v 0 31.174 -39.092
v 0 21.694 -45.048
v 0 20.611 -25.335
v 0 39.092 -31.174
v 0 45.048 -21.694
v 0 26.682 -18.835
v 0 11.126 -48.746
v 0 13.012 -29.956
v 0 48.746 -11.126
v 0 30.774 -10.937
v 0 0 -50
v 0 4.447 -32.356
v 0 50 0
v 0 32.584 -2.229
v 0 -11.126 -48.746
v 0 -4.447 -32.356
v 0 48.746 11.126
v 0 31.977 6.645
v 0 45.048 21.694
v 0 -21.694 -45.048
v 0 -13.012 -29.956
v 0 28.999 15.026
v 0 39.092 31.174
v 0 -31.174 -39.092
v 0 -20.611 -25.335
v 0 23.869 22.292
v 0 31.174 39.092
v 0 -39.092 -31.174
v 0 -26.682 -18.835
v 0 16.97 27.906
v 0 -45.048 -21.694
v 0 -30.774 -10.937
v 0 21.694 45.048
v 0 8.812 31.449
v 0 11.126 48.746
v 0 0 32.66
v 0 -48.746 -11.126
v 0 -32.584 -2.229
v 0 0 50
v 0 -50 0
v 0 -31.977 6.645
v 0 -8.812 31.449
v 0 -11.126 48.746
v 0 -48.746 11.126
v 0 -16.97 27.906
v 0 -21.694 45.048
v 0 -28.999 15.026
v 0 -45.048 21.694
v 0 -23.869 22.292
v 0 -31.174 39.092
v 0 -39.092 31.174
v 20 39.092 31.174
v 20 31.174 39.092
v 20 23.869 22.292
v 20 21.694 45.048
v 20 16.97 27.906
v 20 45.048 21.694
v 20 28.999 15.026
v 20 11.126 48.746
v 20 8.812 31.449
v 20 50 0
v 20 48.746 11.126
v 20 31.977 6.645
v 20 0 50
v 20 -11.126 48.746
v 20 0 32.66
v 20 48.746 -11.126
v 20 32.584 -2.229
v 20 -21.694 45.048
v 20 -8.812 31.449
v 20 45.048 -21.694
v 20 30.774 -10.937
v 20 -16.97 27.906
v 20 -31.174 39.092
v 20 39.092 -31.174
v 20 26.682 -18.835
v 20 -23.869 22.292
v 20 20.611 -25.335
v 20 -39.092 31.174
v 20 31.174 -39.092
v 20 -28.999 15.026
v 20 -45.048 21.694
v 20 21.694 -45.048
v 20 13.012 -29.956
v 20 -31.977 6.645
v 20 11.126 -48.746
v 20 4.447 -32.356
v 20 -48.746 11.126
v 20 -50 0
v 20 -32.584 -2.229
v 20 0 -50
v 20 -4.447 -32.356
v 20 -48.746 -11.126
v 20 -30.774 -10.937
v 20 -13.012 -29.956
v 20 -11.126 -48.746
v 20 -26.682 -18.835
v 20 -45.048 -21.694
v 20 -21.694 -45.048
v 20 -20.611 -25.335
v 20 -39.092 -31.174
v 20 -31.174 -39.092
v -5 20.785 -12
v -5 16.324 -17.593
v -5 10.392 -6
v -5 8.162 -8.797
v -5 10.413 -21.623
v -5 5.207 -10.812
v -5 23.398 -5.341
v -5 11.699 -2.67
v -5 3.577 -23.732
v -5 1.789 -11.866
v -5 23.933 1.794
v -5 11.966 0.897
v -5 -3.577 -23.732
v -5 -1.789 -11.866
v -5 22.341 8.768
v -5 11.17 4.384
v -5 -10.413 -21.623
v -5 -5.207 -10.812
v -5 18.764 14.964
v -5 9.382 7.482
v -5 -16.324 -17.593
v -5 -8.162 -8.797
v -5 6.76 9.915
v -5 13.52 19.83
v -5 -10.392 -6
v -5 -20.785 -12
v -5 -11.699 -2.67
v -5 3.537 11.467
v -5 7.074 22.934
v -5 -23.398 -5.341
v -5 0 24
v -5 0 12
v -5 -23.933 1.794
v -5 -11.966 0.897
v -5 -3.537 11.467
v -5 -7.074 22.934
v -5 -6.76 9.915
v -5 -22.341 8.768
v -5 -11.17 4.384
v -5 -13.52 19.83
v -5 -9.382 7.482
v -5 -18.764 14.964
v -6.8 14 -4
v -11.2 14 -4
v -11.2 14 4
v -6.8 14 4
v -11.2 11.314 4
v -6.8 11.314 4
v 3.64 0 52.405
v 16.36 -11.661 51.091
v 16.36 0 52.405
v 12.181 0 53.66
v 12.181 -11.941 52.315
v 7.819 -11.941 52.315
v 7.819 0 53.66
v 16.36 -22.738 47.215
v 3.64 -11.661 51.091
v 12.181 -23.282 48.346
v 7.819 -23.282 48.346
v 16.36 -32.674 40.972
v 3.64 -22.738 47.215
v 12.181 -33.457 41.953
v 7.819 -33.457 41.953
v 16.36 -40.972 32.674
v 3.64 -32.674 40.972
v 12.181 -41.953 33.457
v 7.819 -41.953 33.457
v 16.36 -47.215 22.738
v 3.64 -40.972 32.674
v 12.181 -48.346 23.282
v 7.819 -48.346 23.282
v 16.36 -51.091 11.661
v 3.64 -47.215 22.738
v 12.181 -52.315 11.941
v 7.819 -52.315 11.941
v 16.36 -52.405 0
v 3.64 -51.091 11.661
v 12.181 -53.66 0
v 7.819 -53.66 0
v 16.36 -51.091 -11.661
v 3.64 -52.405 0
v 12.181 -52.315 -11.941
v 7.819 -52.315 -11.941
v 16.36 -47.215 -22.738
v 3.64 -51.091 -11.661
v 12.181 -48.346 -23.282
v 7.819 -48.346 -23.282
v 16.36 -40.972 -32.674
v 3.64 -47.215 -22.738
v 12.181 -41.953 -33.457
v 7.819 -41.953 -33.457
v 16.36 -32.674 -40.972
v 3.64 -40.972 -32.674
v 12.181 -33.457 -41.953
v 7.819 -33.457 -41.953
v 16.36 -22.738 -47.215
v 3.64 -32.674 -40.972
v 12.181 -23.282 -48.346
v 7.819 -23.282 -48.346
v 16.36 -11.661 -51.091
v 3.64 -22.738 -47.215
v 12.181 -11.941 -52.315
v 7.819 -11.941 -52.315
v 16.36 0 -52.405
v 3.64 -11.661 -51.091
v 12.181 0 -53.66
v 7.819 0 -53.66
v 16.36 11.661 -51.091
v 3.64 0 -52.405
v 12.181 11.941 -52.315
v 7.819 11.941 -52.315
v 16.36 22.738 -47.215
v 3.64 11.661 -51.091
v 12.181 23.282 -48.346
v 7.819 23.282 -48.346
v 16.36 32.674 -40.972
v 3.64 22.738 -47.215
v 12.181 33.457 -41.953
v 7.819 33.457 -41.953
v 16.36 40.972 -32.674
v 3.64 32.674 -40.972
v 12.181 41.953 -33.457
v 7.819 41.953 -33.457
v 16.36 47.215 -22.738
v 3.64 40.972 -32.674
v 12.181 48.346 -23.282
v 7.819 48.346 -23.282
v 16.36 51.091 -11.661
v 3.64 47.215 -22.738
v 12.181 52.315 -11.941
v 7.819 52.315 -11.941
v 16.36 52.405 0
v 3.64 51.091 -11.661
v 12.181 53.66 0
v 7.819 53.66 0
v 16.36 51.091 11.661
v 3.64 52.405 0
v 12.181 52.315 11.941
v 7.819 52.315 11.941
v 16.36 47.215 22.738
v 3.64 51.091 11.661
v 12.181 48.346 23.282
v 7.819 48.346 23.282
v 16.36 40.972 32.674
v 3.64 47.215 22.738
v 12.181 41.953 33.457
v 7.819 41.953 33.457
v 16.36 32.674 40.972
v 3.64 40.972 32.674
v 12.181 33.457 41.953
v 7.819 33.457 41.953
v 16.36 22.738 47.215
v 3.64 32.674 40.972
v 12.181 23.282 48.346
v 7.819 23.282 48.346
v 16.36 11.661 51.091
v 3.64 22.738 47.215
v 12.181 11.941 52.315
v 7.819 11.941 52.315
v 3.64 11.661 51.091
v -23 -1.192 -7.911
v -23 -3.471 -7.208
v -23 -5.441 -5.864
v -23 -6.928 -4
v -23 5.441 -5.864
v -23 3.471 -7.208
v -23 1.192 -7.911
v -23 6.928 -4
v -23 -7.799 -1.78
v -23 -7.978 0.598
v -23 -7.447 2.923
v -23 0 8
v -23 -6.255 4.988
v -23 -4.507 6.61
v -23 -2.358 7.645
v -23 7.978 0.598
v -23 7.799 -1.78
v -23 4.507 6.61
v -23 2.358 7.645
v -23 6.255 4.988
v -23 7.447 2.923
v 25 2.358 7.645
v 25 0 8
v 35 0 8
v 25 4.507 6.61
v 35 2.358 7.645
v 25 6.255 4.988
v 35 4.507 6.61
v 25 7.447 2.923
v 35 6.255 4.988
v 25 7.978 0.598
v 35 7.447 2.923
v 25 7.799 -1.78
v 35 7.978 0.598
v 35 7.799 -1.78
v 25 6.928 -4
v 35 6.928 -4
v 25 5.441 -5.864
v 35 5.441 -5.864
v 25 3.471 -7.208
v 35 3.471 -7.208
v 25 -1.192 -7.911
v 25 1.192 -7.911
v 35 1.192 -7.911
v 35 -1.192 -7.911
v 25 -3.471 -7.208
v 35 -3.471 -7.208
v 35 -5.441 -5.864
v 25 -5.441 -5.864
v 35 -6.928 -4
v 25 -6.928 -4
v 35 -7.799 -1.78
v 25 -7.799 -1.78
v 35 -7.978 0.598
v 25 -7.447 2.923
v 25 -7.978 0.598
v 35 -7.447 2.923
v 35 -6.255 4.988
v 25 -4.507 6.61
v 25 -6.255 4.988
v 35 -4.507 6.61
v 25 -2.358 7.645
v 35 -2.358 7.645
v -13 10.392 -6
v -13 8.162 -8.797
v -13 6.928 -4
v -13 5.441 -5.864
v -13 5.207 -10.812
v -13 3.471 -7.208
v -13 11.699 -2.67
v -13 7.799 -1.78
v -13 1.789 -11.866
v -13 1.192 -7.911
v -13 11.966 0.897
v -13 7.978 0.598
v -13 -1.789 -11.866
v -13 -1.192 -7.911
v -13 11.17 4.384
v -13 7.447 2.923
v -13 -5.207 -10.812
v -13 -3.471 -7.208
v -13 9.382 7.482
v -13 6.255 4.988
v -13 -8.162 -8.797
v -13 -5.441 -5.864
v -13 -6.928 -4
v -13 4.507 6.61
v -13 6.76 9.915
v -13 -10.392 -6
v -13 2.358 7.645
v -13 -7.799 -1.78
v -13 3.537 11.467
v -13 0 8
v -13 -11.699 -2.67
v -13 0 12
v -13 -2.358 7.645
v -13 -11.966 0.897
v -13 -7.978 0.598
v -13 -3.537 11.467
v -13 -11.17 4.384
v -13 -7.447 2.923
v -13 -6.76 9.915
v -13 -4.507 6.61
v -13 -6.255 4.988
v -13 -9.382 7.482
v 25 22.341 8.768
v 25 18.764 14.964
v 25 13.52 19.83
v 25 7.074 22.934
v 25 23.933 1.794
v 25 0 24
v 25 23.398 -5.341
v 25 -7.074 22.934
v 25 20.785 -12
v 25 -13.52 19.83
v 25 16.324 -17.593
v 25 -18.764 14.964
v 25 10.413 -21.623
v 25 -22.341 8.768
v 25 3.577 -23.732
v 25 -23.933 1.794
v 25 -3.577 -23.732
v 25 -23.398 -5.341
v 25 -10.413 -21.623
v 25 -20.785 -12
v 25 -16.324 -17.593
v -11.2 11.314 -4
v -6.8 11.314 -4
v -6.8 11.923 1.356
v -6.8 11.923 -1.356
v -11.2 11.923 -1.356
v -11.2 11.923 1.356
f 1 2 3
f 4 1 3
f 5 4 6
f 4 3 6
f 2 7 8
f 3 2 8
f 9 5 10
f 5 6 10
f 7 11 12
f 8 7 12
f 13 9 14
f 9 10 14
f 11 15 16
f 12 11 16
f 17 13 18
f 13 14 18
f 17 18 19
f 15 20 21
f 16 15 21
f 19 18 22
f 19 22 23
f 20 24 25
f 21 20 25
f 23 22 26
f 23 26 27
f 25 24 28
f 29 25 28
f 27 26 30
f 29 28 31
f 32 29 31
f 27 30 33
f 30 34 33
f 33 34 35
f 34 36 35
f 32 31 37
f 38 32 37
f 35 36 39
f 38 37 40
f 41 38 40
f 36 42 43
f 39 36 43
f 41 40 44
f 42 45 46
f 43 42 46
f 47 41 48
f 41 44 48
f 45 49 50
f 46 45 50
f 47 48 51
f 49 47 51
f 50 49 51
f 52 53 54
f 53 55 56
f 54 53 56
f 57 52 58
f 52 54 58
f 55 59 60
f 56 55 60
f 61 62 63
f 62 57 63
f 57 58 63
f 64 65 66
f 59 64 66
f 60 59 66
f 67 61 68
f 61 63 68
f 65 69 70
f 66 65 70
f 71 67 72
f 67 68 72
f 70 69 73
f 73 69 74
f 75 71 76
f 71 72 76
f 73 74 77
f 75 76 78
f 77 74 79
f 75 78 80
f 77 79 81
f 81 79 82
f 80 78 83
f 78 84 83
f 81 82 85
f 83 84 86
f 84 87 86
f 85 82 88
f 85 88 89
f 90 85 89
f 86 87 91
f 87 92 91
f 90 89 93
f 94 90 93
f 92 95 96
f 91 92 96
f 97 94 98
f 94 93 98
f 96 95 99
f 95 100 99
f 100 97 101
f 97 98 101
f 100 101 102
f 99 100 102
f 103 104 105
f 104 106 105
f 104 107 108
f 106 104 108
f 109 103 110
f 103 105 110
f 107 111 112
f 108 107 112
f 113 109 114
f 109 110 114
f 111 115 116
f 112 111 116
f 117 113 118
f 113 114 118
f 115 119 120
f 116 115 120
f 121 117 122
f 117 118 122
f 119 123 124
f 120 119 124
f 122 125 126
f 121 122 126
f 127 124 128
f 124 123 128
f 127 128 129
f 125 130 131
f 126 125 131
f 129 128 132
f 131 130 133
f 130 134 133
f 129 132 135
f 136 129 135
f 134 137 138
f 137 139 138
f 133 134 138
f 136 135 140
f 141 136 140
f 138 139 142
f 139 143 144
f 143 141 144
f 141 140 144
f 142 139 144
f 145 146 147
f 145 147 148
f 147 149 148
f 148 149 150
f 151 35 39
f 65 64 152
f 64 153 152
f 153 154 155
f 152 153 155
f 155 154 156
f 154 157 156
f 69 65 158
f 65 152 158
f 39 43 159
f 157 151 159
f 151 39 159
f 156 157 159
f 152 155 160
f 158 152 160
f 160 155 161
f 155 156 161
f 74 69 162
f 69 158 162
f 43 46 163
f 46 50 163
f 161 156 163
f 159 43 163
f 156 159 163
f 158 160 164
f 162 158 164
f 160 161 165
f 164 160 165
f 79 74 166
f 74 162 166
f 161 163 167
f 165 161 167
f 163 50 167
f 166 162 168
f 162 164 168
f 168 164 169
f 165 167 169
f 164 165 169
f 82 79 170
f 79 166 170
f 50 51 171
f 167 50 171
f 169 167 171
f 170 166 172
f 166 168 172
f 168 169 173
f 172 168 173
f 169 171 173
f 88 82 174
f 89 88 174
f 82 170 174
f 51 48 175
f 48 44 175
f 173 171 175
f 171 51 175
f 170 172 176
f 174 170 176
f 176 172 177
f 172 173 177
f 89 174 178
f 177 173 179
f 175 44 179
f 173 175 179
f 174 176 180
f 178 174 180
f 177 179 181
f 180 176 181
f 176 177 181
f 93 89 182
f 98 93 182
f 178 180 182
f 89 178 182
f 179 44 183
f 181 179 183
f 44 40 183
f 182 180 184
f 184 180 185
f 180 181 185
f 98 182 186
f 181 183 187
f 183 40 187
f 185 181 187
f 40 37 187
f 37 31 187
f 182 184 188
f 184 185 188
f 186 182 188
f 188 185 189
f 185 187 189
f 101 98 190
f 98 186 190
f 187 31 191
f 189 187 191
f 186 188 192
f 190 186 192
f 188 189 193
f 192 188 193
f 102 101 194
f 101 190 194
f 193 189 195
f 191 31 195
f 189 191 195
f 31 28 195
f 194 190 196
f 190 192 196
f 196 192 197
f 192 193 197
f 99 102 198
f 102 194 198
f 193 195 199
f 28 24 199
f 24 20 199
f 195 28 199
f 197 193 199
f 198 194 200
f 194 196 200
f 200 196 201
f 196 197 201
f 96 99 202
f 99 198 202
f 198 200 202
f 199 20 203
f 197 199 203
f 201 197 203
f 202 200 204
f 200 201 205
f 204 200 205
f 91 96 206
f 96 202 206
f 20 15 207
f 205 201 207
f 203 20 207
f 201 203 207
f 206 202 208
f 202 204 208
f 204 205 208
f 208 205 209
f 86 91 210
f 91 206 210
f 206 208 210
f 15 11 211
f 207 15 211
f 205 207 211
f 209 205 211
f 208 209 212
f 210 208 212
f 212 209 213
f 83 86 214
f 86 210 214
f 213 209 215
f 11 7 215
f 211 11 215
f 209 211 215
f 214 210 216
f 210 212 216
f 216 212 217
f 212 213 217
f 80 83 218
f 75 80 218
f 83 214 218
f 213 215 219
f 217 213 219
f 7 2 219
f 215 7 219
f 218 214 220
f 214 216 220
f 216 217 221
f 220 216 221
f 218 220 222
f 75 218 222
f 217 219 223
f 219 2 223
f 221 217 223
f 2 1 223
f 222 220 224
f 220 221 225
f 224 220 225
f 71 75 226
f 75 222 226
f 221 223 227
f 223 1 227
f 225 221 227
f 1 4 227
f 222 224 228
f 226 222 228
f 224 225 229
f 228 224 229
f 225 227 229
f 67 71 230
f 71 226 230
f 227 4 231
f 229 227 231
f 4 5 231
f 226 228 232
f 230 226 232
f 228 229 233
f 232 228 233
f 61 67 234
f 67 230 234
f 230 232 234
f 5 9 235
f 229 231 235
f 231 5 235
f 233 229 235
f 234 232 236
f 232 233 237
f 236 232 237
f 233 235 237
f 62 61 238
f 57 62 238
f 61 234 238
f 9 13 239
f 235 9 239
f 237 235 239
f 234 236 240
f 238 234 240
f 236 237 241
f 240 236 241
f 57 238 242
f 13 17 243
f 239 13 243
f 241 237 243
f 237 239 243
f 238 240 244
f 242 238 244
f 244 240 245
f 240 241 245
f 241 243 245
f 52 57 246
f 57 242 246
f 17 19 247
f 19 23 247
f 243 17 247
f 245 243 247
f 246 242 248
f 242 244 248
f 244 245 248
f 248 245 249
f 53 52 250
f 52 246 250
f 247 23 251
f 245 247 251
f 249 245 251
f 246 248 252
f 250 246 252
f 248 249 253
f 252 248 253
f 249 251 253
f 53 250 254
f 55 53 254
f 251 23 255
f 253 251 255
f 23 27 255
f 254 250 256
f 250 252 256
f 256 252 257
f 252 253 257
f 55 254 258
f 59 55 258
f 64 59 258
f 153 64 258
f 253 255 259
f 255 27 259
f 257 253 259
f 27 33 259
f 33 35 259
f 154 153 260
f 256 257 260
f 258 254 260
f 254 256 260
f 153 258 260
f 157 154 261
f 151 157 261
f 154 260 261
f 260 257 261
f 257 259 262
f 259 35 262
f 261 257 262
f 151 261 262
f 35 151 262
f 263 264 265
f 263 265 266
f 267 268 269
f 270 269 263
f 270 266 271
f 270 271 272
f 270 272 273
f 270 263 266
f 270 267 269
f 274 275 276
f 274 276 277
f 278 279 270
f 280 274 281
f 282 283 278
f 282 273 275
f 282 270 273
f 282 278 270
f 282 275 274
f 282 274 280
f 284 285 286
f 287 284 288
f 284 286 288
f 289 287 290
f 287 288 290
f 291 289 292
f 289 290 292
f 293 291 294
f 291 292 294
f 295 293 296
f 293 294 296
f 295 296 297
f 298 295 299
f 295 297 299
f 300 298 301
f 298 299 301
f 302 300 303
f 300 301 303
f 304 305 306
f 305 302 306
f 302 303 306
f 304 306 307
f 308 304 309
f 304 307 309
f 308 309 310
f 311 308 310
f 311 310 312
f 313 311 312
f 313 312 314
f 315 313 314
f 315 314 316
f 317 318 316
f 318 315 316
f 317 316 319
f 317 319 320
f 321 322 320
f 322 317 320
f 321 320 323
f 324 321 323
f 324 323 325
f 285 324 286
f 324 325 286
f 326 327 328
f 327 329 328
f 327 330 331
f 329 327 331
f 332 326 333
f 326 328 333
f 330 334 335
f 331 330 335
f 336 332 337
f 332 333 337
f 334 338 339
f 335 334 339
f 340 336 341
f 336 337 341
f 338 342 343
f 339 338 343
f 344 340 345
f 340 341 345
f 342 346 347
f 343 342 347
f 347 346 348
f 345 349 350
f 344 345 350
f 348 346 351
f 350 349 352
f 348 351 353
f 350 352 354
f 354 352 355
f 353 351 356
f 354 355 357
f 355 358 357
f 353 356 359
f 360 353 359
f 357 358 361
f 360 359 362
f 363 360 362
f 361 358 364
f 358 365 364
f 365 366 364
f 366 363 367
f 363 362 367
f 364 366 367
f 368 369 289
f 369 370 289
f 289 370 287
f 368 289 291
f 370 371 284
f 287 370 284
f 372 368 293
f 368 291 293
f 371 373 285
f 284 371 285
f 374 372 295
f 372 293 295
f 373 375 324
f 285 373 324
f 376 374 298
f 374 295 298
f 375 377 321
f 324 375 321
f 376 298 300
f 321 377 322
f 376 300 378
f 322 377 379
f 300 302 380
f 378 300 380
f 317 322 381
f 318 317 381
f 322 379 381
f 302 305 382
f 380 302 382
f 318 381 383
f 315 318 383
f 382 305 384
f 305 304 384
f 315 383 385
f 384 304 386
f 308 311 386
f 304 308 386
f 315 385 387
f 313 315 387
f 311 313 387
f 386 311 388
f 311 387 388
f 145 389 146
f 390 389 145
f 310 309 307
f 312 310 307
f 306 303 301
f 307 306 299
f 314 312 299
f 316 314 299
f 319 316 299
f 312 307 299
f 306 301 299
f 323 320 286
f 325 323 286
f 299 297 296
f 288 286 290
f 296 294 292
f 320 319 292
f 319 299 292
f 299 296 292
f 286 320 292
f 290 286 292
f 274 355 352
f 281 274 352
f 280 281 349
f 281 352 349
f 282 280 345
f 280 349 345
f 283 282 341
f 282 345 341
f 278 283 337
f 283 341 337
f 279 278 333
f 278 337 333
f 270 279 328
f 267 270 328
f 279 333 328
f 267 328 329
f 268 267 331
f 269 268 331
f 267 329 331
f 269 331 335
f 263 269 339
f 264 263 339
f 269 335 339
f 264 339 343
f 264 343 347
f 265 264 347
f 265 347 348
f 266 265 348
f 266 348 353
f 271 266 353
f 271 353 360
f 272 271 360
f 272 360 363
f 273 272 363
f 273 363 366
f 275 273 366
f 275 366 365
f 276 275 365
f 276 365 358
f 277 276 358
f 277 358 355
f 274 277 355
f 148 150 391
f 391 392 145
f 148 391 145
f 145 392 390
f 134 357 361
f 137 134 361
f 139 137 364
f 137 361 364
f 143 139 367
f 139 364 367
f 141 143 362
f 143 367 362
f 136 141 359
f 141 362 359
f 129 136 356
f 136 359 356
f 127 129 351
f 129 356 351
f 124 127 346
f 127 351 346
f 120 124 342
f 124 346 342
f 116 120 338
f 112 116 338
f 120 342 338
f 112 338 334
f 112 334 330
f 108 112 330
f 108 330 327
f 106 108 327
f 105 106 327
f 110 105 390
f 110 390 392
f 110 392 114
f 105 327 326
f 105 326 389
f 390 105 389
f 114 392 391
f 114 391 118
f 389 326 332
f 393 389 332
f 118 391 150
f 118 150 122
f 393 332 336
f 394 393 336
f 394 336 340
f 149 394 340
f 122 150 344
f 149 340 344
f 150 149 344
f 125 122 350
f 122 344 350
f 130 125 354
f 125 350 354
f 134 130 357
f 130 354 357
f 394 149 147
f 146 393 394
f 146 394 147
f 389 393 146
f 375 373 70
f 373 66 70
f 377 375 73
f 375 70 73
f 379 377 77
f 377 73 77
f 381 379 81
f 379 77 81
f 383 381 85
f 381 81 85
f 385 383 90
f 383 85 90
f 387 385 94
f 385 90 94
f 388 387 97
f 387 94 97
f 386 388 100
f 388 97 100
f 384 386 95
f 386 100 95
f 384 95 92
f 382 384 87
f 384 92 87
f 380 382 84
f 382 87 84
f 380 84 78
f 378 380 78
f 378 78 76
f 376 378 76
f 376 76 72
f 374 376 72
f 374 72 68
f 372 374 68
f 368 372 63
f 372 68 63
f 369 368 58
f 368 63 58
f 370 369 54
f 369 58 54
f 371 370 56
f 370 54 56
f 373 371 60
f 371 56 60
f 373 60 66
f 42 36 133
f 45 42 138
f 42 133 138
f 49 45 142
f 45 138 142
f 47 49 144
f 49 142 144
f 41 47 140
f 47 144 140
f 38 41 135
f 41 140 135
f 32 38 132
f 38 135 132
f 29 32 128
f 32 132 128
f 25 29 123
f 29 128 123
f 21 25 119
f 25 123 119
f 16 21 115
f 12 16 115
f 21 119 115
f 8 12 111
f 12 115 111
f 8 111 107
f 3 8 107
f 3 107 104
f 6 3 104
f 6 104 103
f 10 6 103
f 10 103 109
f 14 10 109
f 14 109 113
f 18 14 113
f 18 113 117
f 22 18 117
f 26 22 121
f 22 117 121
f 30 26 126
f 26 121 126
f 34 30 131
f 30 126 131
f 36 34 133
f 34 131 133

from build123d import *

# Parameters (mm, degrees)
EXTRUDE_1_DEPTH      = 10
EXTRUDE_1_DEPTH_BACK = 48
SKETCH_2_R           = 8
SKETCH_3_W           = 4.4
SKETCH_3_H           = 8
EXTRUDE_2_DEPTH      = 14


with BuildPart() as part:
    # 草图1 → 旋转1 (revolve)
    with BuildSketch(Plane.XY, mode=Mode.PRIVATE) as revolve_1_sk:
        with BuildLine():
            Line((20, 0), (25, 0))
            Line((25, 0), (25, 24))
            Line((25, 24), (20, 32.660254038))
            Line((20, 32.660254038), (20, 50))
            ThreePointArc((20, 50), (10, 53.819660113), (0, 50))
            Line((0, 50), (0, 32.660254038))
            Line((0, 32.660254038), (-5, 24))
            Line((-5, 24), (-5, 12))
            Line((-5, 12), (-13, 12))
            Line((-13, 12), (-13, 0))
            Line((-13, 0), (-5, 0))
            Line((-5, 0), (0, 0))
            Line((0, 0), (20, 0))
        make_face()
    revolve(revolve_1_sk.sketch.rotate(Axis((0, 0, 0), (1, 0, 0)), 90), axis=Axis((0, 0, 0), (1, 0, 0)))

    # 草图2 → 凸台-拉伸1 (add, two sides: drawn at the far end of the back side and taken through both)
    with BuildSketch(Plane.ZY.offset(13).offset(-EXTRUDE_1_DEPTH_BACK)):
        Circle(SKETCH_2_R)
    extrude(amount=EXTRUDE_1_DEPTH + EXTRUDE_1_DEPTH_BACK)

    # 草图3 → 凸台-拉伸2 (add)
    with BuildSketch(Plane(origin=(0, 0, 0), x_dir=(1, 0, 0), z_dir=(0, 1, 0))):
        with Locations((-9, 0)):
            Rectangle(SKETCH_3_W, SKETCH_3_H)
    extrude(amount=EXTRUDE_2_DEPTH)


solid = part.part
